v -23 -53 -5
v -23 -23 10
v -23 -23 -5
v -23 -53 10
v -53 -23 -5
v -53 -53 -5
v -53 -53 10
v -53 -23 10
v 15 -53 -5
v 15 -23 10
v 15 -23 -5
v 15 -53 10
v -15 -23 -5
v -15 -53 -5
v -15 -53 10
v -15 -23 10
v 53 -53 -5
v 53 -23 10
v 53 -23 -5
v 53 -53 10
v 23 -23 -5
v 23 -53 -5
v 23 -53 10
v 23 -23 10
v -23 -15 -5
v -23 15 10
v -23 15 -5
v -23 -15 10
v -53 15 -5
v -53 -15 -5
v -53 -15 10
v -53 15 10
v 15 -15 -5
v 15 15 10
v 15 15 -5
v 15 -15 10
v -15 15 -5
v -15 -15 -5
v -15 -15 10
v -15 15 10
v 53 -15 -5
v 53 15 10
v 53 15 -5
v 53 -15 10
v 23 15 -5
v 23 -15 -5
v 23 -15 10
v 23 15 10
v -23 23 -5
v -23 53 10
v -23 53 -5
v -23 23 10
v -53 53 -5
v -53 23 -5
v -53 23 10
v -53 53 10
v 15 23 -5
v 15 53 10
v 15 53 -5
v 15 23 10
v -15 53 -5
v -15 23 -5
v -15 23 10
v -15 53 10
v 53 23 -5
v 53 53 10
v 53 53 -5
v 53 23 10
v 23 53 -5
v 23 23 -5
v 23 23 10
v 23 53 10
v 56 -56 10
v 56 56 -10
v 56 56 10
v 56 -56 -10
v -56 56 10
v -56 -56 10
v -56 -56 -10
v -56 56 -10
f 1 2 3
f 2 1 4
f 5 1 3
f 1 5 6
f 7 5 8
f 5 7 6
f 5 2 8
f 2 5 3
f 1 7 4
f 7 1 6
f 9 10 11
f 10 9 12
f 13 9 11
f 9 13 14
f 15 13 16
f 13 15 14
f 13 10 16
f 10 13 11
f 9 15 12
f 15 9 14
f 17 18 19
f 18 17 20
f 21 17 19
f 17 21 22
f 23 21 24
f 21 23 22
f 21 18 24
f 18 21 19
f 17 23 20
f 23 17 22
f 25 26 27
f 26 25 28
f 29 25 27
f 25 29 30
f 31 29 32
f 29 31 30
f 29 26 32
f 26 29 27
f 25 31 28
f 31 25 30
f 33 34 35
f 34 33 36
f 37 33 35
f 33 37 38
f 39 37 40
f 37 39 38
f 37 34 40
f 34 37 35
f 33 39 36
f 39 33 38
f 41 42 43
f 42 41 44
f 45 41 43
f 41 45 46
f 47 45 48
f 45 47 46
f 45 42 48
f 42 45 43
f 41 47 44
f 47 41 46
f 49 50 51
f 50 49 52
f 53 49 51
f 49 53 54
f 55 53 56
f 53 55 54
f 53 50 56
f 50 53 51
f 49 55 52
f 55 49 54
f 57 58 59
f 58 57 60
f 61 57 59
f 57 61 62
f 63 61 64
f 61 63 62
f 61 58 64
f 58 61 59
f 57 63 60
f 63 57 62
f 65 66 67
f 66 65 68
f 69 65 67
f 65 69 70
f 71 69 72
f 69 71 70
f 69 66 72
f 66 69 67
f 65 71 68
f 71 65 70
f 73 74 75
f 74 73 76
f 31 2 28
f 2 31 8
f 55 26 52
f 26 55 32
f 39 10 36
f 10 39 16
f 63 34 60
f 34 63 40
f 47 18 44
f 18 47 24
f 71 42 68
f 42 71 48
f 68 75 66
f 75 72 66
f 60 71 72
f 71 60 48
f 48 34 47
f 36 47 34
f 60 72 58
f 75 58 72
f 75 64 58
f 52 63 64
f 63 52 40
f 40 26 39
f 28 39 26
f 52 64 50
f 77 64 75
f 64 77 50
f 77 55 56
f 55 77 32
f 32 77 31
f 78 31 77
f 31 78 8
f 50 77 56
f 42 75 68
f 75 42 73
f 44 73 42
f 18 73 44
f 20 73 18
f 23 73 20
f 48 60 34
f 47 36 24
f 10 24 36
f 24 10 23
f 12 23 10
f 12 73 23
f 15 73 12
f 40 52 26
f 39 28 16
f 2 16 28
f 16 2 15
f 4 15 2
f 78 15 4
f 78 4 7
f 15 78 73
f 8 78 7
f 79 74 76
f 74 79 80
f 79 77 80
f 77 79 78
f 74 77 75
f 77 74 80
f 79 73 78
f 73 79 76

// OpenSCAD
$fn = 32;

// ----------------------------------------------------------------------
// Pocket plate 112 x 112 x 20
// 3 x 3 pockets 30 mm square, 15 mm deep
// ----------------------------------------------------------------------

// --- parameters (mm) ---
thickness = 20;  // plate thickness
floor_t = 5;     // material left under each pocket
pocket = 30;     // pocket side length
pitch_x = 38;    // pocket pitch along X
pitch_y = 38;    // pocket pitch along Y
cols = 3;        // pockets per row
rows = 3;        // rows of pockets

// --- derived feature positions (mm) ---
depth = thickness - floor_t;        // = 15   pocket depth, down to the floor
span_x = (cols - 1) * pitch_x;      // = 76   distance between outer pockets
span_y = (rows - 1) * pitch_y;      // = 76   distance between outer pocket rows
origin_x = -span_x / 2;             // = -38   X of the first pocket
origin_y = -span_y / 2;             // = -38   Y of the first pocket
plate = [span_x + pocket + 6, span_y + pocket + 6, thickness];  // = [112, 112, 20]   overall size: pockets plus 3 mm of wall on each side
feature_centers = [
  [origin_x + 0 * pitch_x, origin_y + 0 * pitch_y],
  [origin_x + 1 * pitch_x, origin_y + 0 * pitch_y],
  [origin_x + 2 * pitch_x, origin_y + 0 * pitch_y],
  [origin_x + 0 * pitch_x, origin_y + 1 * pitch_y],
  [origin_x + 1 * pitch_x, origin_y + 1 * pitch_y],
  [origin_x + 2 * pitch_x, origin_y + 1 * pitch_y],
  [origin_x + 0 * pitch_x, origin_y + 2 * pitch_y],
  [origin_x + 1 * pitch_x, origin_y + 2 * pitch_y],
  [origin_x + 2 * pitch_x, origin_y + 2 * pitch_y]
];   // pocket centres, used verbatim by the cutter loop

// plate outline, then one pocket per centre in feature_centers
difference() {
  cube(plate, center = true);
  for (centre = feature_centers)
    translate([centre[0] - pocket / 2, centre[1] - pocket / 2, plate[2] / 2 - depth])
      cube([pocket, pocket, depth + 1]);  // centred on the declared pocket centre
}
